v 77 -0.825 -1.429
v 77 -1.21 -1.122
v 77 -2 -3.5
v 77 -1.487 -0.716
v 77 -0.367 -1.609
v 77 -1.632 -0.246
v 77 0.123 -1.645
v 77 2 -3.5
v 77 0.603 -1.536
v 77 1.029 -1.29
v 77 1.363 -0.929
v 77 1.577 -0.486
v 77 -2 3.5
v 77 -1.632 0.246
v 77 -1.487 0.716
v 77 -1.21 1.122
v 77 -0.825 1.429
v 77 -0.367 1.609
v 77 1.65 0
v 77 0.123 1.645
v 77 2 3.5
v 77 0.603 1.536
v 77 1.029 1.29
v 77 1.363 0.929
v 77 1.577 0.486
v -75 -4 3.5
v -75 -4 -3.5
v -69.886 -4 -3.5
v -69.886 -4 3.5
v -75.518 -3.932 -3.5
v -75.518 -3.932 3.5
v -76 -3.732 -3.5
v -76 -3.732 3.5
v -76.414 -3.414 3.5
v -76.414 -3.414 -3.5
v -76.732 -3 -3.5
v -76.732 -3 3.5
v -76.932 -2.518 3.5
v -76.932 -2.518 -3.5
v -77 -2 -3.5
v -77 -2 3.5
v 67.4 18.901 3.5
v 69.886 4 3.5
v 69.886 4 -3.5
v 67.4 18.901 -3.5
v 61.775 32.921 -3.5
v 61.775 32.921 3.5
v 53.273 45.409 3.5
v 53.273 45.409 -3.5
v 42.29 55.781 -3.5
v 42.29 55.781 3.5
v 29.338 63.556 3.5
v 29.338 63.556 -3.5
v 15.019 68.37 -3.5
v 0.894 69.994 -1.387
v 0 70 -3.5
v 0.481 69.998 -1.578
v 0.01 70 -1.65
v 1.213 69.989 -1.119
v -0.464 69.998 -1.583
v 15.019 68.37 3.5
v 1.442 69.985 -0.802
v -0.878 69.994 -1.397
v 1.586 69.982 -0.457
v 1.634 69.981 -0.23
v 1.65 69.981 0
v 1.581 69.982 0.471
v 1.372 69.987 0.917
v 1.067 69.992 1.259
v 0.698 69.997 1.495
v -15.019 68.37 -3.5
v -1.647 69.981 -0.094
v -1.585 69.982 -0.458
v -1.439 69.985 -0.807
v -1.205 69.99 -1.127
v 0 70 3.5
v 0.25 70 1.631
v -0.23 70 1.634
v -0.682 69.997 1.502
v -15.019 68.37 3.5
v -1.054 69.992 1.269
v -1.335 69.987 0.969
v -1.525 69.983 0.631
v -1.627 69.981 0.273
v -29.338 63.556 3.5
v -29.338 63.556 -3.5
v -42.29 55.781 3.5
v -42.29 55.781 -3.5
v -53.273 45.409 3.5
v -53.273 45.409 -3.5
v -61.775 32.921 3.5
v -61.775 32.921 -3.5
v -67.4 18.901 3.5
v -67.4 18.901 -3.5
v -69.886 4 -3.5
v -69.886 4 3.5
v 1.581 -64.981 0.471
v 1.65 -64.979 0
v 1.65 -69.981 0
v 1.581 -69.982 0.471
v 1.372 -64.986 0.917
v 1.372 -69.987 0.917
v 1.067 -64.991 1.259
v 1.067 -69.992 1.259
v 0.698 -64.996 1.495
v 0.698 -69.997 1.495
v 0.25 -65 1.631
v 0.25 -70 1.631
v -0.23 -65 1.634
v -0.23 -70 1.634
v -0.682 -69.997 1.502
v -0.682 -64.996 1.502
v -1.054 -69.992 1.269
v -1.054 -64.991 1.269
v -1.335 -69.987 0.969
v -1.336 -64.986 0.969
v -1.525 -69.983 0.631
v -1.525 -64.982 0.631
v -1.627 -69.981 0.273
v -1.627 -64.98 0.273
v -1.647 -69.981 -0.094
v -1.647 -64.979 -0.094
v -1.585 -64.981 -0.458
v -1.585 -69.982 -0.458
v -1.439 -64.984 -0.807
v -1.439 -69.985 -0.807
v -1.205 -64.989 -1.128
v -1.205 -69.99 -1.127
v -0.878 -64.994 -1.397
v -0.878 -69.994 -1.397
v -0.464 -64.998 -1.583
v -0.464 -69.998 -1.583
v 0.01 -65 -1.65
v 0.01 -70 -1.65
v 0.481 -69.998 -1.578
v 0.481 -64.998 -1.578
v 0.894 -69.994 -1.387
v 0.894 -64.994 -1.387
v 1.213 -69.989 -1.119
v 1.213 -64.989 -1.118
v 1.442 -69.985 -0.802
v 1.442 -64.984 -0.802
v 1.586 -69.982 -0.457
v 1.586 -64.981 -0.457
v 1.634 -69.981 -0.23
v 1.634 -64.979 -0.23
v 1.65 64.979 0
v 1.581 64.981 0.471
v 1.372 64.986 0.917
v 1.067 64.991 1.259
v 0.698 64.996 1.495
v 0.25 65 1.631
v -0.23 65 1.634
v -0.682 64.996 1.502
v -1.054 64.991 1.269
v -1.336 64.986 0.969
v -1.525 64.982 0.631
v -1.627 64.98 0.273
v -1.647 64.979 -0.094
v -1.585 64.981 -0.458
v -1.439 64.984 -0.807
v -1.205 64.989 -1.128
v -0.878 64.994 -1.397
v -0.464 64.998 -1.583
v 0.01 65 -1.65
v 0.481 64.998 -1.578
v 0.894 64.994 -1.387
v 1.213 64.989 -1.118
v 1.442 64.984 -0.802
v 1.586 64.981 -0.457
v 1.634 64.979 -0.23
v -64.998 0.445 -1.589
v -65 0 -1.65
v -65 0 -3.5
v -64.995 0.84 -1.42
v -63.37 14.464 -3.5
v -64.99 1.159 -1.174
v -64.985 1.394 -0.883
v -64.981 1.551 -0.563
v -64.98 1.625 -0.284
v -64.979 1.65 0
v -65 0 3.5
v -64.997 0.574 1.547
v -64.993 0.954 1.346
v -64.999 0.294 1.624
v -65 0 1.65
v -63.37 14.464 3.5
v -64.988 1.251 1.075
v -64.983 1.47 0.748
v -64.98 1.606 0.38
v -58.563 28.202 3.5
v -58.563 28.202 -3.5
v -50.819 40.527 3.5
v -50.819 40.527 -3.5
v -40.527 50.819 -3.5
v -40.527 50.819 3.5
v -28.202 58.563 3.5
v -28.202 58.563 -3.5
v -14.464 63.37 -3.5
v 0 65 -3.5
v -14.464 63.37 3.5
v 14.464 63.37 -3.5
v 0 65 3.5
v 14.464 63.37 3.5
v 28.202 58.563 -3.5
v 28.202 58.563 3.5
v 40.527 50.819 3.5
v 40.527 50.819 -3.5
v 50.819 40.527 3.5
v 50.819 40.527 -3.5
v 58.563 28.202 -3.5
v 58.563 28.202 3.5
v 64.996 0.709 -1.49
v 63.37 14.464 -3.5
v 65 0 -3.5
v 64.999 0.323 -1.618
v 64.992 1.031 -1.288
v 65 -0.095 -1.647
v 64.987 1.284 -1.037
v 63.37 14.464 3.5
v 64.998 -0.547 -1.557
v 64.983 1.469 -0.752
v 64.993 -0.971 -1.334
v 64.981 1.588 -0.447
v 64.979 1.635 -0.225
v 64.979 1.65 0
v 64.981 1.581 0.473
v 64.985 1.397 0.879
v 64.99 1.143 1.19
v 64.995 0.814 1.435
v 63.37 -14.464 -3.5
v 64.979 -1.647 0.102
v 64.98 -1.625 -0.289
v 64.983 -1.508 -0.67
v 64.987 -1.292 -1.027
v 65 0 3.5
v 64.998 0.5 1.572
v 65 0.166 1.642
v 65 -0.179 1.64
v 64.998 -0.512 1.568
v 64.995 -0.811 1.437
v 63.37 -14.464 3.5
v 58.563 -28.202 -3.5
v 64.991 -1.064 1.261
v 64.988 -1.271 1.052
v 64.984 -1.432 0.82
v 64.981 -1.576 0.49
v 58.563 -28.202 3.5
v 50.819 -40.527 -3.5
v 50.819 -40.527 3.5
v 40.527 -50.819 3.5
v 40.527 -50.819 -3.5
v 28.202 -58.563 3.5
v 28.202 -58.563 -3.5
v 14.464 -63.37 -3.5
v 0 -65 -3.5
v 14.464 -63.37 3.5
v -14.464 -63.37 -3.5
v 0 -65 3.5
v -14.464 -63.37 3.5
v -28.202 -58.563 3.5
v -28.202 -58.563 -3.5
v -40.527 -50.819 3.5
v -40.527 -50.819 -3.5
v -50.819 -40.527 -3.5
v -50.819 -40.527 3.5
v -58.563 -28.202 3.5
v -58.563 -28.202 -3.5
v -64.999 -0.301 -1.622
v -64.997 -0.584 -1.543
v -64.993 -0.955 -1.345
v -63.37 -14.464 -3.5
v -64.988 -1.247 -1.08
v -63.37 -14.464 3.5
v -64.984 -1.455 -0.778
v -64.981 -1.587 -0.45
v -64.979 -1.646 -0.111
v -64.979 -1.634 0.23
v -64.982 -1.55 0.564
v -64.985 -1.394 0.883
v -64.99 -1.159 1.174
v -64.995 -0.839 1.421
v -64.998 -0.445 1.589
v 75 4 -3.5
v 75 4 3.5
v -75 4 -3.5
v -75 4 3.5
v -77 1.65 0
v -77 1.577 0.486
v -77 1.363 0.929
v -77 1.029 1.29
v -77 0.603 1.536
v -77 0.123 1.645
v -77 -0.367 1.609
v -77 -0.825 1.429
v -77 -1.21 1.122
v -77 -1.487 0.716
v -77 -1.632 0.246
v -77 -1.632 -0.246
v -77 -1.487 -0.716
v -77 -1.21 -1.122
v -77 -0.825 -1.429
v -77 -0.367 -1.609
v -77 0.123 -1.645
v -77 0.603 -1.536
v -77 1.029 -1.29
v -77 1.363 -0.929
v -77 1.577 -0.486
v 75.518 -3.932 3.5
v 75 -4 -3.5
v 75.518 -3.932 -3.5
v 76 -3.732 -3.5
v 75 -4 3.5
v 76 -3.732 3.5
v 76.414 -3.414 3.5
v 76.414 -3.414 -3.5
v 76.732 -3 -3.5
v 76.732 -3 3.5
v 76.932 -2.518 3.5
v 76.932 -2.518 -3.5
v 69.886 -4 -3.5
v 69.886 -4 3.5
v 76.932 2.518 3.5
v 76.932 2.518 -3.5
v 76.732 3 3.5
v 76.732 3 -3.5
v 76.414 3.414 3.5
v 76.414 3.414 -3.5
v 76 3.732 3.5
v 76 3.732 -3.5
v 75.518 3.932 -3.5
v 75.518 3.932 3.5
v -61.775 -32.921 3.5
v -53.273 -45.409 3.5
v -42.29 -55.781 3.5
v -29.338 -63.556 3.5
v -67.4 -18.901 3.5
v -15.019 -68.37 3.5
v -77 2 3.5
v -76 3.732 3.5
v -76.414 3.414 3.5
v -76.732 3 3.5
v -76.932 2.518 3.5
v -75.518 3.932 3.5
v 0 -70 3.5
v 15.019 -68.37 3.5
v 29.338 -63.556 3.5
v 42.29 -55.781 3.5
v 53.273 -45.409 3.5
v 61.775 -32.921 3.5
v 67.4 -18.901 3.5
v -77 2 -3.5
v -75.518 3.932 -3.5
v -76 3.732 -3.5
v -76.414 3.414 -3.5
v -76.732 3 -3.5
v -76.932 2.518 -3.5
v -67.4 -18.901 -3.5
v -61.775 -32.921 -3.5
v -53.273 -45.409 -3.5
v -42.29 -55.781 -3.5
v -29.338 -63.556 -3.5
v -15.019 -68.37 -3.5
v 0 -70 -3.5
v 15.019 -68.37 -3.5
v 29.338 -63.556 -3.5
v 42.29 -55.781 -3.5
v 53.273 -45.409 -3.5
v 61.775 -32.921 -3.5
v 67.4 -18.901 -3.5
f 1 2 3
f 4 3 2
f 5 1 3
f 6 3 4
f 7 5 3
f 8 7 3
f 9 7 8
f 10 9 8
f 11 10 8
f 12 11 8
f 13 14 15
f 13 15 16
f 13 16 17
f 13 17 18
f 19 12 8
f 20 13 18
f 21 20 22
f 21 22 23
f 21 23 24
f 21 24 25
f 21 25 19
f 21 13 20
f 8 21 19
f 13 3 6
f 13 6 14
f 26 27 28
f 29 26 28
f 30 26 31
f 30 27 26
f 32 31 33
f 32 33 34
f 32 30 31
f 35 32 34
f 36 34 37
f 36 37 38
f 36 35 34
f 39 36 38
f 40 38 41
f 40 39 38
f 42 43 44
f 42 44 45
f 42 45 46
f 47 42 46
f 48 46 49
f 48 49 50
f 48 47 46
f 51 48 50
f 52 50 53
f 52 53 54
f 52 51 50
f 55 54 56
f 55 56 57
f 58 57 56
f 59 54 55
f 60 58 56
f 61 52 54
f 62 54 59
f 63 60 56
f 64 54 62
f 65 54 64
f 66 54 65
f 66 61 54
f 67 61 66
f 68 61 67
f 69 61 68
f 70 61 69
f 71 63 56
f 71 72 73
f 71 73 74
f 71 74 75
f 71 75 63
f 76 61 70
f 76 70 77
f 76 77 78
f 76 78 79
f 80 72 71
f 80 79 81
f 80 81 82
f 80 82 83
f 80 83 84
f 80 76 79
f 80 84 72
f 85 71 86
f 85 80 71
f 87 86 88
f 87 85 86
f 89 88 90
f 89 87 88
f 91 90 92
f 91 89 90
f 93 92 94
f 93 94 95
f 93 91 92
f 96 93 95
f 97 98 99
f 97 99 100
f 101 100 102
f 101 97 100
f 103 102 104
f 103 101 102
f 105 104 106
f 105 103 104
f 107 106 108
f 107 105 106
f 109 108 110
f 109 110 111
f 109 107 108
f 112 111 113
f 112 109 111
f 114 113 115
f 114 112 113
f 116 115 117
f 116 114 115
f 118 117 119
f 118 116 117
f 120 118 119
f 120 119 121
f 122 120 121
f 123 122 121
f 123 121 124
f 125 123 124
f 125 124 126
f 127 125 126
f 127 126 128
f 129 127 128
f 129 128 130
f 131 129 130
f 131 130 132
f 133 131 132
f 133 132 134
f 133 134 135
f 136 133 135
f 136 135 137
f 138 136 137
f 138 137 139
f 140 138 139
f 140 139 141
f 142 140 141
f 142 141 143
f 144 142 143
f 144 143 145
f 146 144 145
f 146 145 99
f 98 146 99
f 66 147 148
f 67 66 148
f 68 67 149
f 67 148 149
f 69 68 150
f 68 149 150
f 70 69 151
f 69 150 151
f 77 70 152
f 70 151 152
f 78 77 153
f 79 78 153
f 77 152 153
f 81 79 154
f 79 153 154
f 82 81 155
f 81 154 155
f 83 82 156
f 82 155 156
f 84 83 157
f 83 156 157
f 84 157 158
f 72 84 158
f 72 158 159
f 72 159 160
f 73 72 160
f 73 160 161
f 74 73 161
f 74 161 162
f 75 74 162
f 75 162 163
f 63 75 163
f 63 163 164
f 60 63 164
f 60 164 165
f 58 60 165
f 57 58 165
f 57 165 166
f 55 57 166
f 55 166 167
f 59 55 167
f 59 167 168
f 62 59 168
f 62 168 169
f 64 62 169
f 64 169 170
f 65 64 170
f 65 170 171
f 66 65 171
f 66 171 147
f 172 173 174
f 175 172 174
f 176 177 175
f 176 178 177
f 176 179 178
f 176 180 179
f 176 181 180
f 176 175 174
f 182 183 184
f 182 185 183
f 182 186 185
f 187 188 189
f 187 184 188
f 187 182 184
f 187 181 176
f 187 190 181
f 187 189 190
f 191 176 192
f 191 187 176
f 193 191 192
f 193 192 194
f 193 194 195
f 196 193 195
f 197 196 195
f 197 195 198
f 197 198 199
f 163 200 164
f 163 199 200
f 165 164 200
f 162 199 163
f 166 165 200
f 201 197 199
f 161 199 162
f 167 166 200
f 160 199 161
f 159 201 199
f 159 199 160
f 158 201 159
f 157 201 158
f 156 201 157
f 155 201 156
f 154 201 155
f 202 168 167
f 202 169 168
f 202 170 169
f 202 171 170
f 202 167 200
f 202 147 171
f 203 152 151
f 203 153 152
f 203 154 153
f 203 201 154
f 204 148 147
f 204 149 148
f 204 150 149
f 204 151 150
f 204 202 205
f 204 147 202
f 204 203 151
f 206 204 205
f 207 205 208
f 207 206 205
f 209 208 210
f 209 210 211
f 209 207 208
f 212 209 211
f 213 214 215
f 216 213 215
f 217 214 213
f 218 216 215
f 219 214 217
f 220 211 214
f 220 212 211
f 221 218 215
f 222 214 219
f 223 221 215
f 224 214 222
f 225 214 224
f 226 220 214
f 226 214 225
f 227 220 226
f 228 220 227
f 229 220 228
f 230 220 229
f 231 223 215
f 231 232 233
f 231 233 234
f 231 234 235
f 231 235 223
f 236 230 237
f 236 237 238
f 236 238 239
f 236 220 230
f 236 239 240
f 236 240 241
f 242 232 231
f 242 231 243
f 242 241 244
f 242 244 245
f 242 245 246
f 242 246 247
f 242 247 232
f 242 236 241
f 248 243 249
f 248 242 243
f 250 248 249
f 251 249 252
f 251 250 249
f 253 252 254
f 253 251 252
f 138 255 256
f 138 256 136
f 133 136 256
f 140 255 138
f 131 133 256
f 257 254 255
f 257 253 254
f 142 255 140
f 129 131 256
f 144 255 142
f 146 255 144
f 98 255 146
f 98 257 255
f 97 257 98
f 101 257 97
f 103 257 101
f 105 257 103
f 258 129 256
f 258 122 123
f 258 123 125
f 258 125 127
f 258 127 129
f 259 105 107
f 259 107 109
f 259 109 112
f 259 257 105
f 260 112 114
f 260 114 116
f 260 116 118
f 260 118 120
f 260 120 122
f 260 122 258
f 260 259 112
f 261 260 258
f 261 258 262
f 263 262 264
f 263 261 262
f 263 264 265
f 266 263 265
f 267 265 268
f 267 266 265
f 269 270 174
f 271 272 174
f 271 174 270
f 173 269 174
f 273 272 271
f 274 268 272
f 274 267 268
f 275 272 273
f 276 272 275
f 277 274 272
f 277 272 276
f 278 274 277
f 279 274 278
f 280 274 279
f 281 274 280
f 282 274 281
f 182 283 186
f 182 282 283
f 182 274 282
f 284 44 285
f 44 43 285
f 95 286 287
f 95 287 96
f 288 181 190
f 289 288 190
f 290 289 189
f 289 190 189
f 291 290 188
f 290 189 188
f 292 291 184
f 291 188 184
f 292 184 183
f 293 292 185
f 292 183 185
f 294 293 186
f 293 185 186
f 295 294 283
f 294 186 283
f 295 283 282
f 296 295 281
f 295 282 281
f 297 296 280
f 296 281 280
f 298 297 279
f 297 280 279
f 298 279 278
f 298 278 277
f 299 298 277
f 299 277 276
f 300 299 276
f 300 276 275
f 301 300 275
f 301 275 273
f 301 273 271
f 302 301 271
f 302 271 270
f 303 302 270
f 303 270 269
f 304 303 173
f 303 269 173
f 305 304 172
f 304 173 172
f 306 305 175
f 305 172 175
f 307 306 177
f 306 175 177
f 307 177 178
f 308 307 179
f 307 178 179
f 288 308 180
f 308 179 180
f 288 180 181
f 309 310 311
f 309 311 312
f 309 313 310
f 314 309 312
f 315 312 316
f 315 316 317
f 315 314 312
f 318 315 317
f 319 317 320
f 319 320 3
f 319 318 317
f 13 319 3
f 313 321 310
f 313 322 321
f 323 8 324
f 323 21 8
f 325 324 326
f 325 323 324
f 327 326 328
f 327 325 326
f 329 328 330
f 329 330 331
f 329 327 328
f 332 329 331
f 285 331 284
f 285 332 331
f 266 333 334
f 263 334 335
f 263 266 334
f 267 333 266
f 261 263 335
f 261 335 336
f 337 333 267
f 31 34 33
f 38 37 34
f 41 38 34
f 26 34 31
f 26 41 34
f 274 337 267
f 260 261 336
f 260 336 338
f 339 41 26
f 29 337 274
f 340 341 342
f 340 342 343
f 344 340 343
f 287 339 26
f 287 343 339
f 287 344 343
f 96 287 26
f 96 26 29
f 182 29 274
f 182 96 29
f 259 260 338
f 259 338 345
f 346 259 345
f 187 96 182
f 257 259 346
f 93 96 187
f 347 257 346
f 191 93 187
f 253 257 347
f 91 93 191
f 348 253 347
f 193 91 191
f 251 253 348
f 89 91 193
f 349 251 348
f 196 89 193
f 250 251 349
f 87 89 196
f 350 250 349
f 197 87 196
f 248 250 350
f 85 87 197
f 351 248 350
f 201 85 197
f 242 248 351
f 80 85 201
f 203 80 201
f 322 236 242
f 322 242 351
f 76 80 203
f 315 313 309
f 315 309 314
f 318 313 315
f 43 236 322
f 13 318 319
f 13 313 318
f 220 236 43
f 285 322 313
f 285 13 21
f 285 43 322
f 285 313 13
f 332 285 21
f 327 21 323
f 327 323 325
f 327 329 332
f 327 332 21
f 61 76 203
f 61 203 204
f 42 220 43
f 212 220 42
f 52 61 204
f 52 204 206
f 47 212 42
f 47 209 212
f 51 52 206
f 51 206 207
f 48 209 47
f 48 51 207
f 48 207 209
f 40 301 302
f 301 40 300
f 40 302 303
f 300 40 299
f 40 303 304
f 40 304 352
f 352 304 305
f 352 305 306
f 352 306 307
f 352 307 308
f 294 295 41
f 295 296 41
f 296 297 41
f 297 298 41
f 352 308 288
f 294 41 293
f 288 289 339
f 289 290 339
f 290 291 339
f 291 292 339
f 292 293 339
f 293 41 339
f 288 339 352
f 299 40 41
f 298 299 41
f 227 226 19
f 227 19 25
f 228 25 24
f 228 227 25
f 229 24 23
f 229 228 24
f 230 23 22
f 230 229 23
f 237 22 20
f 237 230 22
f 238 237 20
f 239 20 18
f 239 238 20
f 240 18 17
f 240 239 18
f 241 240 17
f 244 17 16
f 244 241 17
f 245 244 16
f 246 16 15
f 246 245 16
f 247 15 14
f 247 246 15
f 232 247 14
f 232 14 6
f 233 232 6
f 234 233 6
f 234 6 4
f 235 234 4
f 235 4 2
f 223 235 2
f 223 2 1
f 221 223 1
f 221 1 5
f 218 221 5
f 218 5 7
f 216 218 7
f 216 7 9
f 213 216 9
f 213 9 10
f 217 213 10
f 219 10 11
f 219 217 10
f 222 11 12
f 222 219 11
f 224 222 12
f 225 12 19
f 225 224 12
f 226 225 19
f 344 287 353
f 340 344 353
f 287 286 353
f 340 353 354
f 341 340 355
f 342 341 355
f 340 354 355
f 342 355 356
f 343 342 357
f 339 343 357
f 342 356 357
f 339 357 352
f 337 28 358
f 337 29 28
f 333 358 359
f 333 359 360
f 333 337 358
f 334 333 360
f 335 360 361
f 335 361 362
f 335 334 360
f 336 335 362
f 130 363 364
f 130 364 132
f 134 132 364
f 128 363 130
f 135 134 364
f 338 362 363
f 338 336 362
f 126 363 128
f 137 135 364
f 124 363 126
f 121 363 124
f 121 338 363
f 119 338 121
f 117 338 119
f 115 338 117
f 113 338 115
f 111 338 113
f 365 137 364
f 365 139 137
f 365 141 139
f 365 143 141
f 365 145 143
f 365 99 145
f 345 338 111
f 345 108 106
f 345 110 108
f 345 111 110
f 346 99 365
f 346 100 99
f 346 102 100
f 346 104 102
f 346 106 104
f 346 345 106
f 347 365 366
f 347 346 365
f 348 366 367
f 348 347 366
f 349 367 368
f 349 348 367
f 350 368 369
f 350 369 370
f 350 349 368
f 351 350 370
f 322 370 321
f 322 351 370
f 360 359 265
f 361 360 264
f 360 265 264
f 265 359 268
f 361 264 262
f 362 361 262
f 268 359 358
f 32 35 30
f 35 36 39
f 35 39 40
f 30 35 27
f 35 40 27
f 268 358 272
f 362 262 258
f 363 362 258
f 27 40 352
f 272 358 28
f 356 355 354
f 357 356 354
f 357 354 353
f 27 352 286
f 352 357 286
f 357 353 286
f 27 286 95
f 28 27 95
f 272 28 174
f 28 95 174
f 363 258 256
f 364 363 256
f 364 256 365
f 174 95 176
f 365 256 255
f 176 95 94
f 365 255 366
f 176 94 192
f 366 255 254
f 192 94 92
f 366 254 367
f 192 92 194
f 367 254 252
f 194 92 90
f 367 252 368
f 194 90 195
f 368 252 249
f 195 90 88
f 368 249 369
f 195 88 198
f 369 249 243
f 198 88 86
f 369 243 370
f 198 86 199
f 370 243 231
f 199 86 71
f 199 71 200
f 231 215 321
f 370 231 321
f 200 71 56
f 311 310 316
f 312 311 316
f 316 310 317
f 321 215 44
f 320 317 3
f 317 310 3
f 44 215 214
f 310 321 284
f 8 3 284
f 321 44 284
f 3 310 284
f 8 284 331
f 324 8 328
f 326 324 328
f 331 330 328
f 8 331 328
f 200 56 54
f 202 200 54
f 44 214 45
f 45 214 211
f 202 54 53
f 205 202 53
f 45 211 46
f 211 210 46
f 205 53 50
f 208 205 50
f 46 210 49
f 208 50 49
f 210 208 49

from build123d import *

# Parameters (mm, degrees)
SKETCH071_R          = 70
SKETCH071_R_2        = 65
SKETCH071_W          = 12
SKETCH071_H          = 8
PAD004_DEPTH         = 3.5
PAD005_DEPTH         = 3.5
SKETCH073_R          = 1.65
POCKET003_DEPTH      = 70.001
POCKET003_DEPTH_BACK = 70.001
SKETCH084_R          = 1.65
POCKET010_DEPTH      = 77.001
POCKET010_DEPTH_BACK = 77.001
FILLET002_R          = 2


with BuildPart() as part:
    # Sketch071 → Pad004 (new body, symmetric)
    with BuildSketch(Plane.XY):
        Circle(SKETCH071_R)
        Circle(SKETCH071_R_2, mode=Mode.SUBTRACT)
        with Locations((71, 0)):
            Rectangle(SKETCH071_W, SKETCH071_H)
        with Locations((-71, 0)):
            Rectangle(SKETCH071_W, SKETCH071_H)
    extrude(amount=PAD004_DEPTH, both=True)

    # Sketch071 → Pad005 (join, symmetric)
    with BuildSketch(Plane.XY):
        Circle(SKETCH071_R)
        Circle(SKETCH071_R_2, mode=Mode.SUBTRACT)
        with Locations((71, 0)):
            Rectangle(SKETCH071_W, SKETCH071_H)
        with Locations((-71, 0)):
            Rectangle(SKETCH071_W, SKETCH071_H)
    extrude(amount=PAD005_DEPTH, both=True)

    # Sketch073 → Pocket003 (cut, two sides)
    with BuildSketch(Plane.XZ) as pocket003_sk:
        Circle(SKETCH073_R)
    extrude(amount=-POCKET003_DEPTH, mode=Mode.SUBTRACT)
    extrude(pocket003_sk.sketch, amount=POCKET003_DEPTH_BACK, mode=Mode.SUBTRACT)

    # Sketch084 → Pocket010 (cut, two sides)
    with BuildSketch(Plane.YZ) as pocket010_sk:
        Circle(SKETCH084_R)
    extrude(amount=-POCKET010_DEPTH, mode=Mode.SUBTRACT)
    extrude(pocket010_sk.sketch, amount=POCKET010_DEPTH_BACK, mode=Mode.SUBTRACT)

    # Fillet002
    fillet002_edges = [part.edges().sort_by_distance(p)[0] for p in [
        (77, -4, 0),
        (77, 4, 0),
        (-77, -4, 0),
        (-77, 4, 0),
    ]]
    fillet(fillet002_edges, radius=FILLET002_R)


solid = part.part
